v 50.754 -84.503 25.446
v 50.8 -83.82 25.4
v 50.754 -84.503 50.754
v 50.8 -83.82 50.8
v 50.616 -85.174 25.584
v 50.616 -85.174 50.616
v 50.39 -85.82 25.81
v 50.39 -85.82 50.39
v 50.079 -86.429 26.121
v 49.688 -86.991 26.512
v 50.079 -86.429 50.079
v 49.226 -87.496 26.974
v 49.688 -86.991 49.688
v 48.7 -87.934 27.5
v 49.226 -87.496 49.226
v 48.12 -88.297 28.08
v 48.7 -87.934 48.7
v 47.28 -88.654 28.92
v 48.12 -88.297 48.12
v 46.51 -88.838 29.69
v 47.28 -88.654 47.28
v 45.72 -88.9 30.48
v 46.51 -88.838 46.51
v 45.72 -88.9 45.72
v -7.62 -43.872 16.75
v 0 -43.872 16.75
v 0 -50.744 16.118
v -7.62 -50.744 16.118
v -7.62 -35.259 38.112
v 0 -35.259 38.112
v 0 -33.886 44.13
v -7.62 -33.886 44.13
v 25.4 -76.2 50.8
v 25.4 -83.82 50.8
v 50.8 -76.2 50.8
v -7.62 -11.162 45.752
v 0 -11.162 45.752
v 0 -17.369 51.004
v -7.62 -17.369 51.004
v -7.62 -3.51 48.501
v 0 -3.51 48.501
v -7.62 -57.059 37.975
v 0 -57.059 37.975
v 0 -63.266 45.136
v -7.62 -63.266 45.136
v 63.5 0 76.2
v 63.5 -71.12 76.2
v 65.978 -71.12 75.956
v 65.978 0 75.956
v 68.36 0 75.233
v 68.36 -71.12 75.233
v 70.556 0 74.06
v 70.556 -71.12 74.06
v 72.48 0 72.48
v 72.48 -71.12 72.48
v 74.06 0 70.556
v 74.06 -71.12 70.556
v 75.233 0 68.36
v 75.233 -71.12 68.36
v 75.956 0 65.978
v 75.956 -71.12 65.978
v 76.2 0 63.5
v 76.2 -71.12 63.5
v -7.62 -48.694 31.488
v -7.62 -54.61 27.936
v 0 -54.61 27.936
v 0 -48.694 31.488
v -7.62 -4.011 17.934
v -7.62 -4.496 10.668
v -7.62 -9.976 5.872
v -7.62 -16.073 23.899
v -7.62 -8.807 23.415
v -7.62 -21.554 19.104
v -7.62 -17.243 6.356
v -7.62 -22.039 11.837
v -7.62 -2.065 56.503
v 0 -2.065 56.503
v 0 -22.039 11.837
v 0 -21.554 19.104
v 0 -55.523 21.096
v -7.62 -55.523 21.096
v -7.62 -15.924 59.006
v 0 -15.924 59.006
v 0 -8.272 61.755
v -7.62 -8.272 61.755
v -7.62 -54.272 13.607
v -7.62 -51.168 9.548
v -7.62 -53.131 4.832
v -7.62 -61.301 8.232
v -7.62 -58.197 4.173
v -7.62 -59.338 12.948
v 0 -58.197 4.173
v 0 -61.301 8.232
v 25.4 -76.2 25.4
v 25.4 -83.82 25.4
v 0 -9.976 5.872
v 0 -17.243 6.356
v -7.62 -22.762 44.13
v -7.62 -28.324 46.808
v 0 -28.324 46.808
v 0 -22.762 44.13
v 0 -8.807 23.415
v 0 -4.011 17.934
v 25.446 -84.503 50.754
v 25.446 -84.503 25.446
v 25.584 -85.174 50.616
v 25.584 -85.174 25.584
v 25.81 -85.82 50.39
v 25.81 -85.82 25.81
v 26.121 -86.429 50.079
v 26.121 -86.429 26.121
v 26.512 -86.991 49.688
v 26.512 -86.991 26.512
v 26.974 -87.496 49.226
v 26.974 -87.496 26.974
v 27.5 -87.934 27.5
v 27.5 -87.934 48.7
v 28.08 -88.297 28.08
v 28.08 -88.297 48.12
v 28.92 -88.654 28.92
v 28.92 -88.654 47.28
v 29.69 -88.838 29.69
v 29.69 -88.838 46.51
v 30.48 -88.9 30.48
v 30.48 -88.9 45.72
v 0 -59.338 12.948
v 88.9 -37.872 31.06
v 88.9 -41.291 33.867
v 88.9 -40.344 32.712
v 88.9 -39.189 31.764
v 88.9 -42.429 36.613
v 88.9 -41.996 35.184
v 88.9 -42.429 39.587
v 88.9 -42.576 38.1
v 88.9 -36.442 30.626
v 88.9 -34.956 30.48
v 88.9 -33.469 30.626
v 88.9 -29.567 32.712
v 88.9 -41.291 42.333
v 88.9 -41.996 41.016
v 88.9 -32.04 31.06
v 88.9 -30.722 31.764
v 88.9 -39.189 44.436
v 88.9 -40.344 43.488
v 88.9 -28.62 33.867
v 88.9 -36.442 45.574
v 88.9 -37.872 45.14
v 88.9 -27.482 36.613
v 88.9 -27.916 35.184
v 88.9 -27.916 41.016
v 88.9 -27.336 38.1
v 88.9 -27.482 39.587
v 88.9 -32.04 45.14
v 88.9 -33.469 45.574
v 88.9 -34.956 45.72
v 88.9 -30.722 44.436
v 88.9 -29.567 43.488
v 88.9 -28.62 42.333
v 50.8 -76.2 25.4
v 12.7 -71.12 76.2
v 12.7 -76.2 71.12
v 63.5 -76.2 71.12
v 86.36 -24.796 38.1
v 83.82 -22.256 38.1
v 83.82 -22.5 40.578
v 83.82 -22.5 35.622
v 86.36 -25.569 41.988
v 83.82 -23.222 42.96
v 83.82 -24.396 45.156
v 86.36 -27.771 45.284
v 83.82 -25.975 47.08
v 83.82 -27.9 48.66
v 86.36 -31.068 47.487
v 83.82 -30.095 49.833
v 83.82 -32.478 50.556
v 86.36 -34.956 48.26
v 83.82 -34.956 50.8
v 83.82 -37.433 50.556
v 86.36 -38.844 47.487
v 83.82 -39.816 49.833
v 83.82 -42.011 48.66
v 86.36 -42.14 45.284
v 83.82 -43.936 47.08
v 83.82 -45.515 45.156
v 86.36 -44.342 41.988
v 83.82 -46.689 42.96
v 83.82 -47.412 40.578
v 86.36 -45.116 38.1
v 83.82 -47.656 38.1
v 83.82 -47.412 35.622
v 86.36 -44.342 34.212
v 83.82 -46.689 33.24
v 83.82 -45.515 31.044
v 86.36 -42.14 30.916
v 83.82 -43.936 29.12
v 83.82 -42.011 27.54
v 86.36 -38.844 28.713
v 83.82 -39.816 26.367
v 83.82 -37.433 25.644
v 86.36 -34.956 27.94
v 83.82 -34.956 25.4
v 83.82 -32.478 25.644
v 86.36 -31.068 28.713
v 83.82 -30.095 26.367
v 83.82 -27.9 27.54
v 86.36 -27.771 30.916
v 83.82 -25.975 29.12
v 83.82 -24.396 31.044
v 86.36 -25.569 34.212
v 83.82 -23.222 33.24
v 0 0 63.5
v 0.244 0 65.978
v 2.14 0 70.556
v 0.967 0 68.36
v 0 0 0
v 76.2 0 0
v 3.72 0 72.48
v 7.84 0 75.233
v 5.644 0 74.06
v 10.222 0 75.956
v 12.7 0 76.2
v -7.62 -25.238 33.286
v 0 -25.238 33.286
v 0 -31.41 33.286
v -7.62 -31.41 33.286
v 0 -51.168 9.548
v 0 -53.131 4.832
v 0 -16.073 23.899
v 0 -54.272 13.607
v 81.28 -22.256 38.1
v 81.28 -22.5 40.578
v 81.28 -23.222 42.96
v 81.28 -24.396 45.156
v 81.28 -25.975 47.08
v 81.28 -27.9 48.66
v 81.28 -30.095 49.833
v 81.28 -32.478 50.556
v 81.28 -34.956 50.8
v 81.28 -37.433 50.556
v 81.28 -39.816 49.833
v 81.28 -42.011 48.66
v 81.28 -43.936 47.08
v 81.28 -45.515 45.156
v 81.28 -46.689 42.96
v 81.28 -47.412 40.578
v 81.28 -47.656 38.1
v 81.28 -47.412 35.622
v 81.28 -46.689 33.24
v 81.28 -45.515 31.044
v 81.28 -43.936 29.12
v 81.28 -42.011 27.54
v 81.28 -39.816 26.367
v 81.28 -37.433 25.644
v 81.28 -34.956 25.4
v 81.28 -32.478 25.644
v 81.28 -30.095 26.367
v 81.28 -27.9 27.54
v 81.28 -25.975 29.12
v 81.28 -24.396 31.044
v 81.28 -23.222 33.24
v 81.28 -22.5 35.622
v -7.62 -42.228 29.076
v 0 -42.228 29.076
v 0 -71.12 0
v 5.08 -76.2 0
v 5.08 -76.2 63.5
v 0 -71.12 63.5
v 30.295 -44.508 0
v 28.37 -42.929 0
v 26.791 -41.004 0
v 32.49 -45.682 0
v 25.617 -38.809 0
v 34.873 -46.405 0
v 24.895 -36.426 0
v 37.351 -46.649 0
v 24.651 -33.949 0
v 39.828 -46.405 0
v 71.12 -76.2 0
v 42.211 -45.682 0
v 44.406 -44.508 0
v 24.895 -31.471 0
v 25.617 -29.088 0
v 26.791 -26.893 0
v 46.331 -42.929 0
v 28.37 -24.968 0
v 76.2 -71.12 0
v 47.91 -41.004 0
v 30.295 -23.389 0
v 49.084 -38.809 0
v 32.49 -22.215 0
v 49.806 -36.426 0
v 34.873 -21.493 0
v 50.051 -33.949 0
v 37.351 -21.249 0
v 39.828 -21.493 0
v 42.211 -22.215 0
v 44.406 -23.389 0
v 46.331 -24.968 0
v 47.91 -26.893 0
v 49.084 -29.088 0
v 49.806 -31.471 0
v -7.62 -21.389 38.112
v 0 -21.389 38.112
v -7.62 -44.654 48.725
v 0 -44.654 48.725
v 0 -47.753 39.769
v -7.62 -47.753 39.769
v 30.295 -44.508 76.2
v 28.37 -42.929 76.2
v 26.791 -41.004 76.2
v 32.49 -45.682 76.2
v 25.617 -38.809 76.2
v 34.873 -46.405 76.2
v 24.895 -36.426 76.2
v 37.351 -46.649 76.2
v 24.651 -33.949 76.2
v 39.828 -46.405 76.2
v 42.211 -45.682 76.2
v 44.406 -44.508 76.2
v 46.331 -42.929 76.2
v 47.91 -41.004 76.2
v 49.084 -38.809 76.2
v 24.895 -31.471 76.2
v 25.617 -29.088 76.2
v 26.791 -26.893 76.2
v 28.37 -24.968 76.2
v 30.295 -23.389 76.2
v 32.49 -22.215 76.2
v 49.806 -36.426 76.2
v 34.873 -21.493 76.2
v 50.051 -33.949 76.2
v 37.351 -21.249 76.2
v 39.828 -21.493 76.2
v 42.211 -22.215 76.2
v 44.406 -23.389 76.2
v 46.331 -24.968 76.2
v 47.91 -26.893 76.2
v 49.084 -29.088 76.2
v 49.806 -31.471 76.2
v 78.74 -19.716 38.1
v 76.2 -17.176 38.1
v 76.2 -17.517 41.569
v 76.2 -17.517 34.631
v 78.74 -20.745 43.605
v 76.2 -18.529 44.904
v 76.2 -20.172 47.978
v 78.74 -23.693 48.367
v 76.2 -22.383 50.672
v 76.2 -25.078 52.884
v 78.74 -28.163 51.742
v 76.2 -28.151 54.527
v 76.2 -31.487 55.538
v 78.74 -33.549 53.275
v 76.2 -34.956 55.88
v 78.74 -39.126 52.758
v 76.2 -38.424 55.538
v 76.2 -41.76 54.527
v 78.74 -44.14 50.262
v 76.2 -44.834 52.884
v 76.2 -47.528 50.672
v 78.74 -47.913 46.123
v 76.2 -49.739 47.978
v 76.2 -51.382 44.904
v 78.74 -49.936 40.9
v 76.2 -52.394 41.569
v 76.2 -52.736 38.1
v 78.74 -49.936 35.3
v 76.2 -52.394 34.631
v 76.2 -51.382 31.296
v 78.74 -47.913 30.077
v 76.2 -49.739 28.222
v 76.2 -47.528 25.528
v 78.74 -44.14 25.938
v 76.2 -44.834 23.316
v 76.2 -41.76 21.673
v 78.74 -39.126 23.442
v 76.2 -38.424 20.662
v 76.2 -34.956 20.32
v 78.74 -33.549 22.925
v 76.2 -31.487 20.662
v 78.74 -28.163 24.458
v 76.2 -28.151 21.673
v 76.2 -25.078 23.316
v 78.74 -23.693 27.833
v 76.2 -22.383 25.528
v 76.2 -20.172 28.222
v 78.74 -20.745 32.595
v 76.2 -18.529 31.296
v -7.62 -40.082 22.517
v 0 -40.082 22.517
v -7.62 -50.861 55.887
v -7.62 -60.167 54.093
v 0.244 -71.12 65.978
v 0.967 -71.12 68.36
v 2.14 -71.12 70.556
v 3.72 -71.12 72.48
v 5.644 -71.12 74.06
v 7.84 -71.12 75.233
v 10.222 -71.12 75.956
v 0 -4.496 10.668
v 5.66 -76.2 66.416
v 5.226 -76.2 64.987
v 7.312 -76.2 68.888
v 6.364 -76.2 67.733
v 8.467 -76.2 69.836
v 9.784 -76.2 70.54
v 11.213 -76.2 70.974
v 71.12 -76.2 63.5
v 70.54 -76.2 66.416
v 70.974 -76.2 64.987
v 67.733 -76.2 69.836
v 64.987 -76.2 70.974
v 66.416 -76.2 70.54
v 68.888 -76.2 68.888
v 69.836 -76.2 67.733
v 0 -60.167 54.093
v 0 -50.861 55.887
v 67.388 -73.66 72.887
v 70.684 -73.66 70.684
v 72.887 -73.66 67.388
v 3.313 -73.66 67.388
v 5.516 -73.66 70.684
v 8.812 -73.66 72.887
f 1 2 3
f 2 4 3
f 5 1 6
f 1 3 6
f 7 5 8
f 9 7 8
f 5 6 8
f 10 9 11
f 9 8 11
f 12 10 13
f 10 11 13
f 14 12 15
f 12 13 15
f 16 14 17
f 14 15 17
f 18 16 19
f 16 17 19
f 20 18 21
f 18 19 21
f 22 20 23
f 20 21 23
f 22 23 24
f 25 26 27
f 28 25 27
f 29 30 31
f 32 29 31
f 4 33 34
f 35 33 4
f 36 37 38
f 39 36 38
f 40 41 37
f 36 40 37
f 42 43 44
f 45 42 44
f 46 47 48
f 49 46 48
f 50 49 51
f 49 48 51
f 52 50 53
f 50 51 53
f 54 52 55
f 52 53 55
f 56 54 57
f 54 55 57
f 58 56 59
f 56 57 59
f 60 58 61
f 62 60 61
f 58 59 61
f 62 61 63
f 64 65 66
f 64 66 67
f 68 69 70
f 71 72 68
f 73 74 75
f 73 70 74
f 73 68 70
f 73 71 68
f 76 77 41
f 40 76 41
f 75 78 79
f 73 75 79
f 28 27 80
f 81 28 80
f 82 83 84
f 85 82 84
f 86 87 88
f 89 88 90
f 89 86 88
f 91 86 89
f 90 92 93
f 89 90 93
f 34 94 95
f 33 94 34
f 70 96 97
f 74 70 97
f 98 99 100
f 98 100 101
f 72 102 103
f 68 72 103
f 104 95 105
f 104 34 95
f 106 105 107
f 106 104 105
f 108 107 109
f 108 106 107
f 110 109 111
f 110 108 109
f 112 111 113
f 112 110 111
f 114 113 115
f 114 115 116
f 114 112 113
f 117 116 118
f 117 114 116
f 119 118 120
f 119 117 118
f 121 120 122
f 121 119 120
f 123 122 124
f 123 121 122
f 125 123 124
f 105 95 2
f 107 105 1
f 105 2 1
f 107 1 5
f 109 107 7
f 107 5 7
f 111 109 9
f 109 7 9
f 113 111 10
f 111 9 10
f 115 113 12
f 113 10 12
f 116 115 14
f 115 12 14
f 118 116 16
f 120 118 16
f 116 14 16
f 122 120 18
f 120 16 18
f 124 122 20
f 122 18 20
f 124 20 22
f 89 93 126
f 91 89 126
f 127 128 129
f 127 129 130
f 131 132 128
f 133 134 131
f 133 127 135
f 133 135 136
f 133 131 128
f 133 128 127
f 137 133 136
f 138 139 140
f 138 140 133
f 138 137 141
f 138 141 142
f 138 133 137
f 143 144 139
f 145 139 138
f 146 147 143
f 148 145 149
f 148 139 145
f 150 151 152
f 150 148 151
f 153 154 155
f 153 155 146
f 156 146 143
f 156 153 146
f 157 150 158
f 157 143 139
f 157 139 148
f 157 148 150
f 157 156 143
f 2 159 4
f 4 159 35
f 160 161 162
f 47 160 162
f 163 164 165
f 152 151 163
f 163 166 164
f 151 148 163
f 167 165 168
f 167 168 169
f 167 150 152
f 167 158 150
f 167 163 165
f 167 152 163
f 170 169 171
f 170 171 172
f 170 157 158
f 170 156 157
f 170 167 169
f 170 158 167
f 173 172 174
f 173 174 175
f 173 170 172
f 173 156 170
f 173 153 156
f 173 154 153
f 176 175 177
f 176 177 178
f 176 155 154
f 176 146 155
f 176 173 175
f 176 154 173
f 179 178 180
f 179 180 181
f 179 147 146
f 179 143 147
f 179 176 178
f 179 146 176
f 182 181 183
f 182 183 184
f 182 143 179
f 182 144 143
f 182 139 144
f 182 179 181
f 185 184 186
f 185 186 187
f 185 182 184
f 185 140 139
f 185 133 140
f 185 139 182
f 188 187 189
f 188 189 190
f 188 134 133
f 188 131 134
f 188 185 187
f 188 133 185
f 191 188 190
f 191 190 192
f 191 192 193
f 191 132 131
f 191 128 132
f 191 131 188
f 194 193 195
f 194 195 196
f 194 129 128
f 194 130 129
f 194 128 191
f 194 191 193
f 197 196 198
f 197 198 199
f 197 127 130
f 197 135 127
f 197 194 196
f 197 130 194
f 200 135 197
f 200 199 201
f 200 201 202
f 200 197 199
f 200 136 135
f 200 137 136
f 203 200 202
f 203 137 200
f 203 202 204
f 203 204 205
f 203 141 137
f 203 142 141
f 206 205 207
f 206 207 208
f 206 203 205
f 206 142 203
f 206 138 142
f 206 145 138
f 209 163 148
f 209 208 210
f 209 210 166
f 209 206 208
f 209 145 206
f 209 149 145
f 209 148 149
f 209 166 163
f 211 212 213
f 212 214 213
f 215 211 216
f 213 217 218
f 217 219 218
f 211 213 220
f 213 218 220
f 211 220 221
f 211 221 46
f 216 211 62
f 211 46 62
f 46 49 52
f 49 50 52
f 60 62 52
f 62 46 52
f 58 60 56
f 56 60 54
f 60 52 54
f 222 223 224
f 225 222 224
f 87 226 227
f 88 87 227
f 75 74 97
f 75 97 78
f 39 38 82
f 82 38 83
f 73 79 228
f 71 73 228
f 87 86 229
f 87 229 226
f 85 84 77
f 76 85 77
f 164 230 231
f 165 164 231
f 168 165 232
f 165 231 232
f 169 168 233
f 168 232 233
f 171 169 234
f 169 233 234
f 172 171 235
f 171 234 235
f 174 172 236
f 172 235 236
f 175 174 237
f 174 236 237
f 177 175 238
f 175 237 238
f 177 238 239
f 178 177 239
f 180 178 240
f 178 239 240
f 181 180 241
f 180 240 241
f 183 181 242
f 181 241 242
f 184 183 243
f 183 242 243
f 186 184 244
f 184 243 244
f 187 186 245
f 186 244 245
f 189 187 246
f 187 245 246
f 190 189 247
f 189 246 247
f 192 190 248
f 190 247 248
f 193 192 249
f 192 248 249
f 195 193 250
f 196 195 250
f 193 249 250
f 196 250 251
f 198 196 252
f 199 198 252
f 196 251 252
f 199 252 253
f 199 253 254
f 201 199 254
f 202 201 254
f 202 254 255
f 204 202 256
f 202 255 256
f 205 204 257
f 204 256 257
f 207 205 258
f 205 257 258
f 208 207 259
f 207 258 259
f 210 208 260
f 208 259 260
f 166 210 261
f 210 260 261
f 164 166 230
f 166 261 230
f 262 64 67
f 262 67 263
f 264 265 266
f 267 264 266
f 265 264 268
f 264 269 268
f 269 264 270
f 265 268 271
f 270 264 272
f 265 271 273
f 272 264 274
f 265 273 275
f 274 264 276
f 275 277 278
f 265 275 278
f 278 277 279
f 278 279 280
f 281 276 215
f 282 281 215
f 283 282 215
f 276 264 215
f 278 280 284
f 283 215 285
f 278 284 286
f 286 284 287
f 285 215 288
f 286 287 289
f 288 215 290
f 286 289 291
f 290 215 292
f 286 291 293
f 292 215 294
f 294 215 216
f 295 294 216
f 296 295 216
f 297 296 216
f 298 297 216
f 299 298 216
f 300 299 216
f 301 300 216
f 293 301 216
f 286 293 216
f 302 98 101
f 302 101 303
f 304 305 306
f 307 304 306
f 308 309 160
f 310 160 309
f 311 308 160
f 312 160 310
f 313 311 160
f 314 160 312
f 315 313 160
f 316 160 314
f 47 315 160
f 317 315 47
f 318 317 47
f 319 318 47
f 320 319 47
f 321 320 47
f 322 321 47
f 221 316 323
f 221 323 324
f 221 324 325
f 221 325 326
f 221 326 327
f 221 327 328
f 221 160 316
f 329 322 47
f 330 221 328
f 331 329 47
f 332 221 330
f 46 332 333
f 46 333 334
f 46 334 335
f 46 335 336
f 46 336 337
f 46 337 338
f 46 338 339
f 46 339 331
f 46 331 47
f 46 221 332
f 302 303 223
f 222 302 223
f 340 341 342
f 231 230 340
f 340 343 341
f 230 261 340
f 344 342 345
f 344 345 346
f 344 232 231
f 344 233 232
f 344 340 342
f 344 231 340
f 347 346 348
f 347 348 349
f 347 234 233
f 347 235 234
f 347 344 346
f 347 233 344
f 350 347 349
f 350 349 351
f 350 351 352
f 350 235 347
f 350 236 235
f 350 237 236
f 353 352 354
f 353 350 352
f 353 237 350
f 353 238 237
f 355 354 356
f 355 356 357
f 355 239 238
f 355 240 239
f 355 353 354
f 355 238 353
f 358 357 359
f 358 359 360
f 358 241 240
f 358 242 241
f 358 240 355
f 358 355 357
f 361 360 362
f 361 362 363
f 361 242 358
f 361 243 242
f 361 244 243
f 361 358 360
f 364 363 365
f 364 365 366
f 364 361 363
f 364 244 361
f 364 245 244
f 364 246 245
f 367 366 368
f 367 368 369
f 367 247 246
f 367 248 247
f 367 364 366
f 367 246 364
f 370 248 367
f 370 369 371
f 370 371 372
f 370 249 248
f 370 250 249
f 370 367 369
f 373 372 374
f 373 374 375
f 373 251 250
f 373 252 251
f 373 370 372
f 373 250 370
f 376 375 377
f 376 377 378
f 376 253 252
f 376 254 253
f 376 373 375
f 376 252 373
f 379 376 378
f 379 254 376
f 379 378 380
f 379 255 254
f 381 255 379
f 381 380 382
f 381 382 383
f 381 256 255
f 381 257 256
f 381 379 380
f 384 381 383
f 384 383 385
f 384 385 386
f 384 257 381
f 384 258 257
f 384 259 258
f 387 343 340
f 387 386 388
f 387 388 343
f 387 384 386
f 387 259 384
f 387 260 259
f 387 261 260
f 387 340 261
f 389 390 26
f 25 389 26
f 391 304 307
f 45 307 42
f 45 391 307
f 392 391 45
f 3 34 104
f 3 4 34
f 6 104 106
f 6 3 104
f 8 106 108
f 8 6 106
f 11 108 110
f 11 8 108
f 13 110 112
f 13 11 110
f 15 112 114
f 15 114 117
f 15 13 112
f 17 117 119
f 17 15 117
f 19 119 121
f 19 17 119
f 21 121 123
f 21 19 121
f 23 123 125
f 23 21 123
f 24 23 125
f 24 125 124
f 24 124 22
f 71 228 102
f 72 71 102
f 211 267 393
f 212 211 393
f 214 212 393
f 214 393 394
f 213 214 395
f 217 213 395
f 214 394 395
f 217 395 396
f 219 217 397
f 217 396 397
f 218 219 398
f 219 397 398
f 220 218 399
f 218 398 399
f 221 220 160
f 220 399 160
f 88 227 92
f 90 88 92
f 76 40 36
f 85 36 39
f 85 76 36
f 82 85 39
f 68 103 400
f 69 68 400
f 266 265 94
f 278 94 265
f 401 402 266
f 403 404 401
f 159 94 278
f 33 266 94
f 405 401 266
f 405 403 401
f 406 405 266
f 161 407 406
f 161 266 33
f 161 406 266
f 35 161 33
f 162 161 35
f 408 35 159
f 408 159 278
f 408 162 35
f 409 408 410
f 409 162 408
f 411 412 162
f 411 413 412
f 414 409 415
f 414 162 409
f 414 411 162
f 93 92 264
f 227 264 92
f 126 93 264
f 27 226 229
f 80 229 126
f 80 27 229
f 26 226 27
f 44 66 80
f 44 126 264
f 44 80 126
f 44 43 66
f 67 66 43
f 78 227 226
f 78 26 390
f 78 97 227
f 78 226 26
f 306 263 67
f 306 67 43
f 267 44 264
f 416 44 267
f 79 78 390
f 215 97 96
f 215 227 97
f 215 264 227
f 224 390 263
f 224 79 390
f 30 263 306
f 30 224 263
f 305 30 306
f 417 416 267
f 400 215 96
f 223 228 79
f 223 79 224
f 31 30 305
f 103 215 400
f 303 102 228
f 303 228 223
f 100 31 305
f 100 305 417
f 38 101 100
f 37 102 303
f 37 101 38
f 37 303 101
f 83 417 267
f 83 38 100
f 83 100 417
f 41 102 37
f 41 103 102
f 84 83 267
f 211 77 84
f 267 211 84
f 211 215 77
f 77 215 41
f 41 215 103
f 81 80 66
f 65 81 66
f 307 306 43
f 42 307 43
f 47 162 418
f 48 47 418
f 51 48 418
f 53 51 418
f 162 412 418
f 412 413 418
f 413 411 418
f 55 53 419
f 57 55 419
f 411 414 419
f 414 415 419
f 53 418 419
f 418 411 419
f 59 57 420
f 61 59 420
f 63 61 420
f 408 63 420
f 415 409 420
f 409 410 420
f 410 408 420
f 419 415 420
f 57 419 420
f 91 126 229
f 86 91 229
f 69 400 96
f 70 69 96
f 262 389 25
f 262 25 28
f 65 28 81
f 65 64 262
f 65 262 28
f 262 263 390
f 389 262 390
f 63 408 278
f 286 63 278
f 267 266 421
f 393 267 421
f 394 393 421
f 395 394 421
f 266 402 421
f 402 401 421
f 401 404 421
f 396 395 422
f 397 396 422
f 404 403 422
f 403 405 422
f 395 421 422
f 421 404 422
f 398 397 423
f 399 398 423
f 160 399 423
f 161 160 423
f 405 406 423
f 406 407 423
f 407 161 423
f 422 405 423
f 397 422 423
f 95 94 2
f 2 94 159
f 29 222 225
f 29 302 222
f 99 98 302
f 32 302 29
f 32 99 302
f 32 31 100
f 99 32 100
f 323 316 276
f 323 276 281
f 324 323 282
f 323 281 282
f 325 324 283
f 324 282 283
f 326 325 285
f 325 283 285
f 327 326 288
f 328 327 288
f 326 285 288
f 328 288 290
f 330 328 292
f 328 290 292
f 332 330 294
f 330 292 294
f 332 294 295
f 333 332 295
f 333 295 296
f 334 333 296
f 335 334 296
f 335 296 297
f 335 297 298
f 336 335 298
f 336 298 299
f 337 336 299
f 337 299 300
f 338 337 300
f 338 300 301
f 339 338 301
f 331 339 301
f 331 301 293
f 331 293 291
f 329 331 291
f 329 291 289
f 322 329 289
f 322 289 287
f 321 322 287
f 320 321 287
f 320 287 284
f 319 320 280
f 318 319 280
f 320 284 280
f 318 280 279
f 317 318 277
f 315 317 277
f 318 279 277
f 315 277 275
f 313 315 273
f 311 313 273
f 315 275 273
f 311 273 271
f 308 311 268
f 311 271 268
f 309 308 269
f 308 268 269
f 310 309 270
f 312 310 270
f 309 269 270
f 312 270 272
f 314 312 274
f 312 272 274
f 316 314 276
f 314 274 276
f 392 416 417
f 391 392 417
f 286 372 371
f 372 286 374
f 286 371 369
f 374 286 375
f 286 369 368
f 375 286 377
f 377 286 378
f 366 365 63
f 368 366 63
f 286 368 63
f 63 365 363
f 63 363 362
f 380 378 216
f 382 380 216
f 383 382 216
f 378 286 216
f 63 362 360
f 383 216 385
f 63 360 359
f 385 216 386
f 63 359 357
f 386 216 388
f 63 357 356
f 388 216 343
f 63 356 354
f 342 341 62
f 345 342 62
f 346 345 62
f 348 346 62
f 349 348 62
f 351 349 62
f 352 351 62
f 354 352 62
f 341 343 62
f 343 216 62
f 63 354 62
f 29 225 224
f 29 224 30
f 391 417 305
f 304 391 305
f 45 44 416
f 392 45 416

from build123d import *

# Parameters (mm, degrees)
F0_W      = 76.2
F0_H      = 76.2
F1_DEPTH  = 76.2
F3_D      = 25.4
F4_W      = 25.4
F4_H      = 25.4
F5_DEPTH  = 12.7
F6_R      = 12.7
F7_DEPTH  = 12.7
F8_R      = 12.7
F9_R      = 12.7
F10_SIZE  = 5.08
F11_SIZE  = 5.08
F12_R     = 5.08
F14_DEPTH = 7.62
F16_DEPTH = 7.62
F18_DEPTH = 7.62
F20_DEPTH = 7.62
F22_DEPTH = 7.62
F24_DEPTH = 7.62


with BuildPart() as f1:
    # F0 (on Front) → F1 (new body)
    with BuildSketch(Plane.XZ):
        with Locations((38.1, 38.1)):
            Rectangle(F0_W, F0_H)
    extrude(amount=F1_DEPTH)

    # F3 (through all)
    with Locations(Plane.XY.offset(76.2)):
        with Locations((37.350509, -33.948544)):
            Hole(F3_D / 2)

    # F4 (on face) → F5 (join)
    with BuildSketch(Plane.XZ.offset(76.2)):
        with Locations((38.1, 38.1)):
            Rectangle(F4_W, F4_H)
    extrude(amount=F5_DEPTH)

    # F6 (on face) → F7 (join)
    with BuildSketch(Plane.YZ.offset(76.2)):
        with Locations((-34.955569, 38.1)):
            Circle(F6_R)
    extrude(amount=F7_DEPTH)

    # F8
    f8_edges = [f1.edges().sort_by_distance(p)[0] for p in [
        (0, -38.1, 76.2),
    ]]
    fillet(f8_edges, radius=F8_R)

    # F9
    f9_edges = [f1.edges().sort_by_distance(p)[0] for p in [
        (76.2, -38.1, 76.2),
    ]]
    fillet(f9_edges, radius=F9_R)

    # F10
    f10_edges = [f1.edges().sort_by_distance(p)[0] for p in [
        (0, -76.2, 31.75),
    ]]
    chamfer(f10_edges, length=F10_SIZE)

    # F11
    f11_edges = [f1.edges().sort_by_distance(p)[0] for p in [
        (82.55, -22.255569, 38.1),
        (76.2, -47.655569, 38.1),
        (88.9, -47.655569, 38.1),
    ]]
    chamfer(f11_edges, length=F11_SIZE)

    # F12
    f12_edges = [f1.edges().sort_by_distance(p)[0] for p in [
        (38.1, -88.9, 50.8),
        (25.4, -88.9, 38.1),
        (38.1, -88.9, 25.4),
        (50.8, -88.9, 38.1),
    ]]
    fillet(f12_edges, radius=F12_R)

    # F13 (on face) → F14 (join)
    with BuildSketch(Plane(origin=(0, 0, 0), x_dir=(0, -1, 0), z_dir=(-1, 0, 0))):
        Polygon((25.23751, 33.285815), (31.410398, 33.285815), (35.259131, 38.111974), (33.885534, 44.130095), (28.323954, 46.808411), (22.762373, 44.130095), (21.388777, 38.111974), align=None)
    extrude(amount=F14_DEPTH)

    # F15 (on face) → F16 (join)
    with BuildSketch(Plane(origin=(0, 0, 0), x_dir=(0, -1, 0), z_dir=(-1, 0, 0))):
        Polygon((50.743747, 16.11791), (55.522759, 21.096045), (54.610361, 27.936243), (48.693608, 31.487695), (42.227936, 29.076085), (40.082127, 22.517406), (43.87202, 16.750475), align=None)
    extrude(amount=F16_DEPTH)

    # F17 (on face) → F18 (join)
    with BuildSketch(Plane(origin=(0, 0, 0), x_dir=(0, -1, 0), z_dir=(-1, 0, 0))):
        Polygon((57.059099, 37.974671), (63.266012, 45.136495), (60.167147, 54.092752), (50.861369, 55.887184), (44.654456, 48.72536), (47.753321, 39.769104), align=None)
    extrude(amount=F18_DEPTH)

    # F19 (on face) → F20 (join)
    with BuildSketch(Plane(origin=(0, 0, 0), x_dir=(0, -1, 0), z_dir=(-1, 0, 0))):
        Polygon((17.242883, 6.356385), (22.038512, 11.837104), (21.55408, 19.10358), (16.07336, 23.89921), (8.806884, 23.414778), (4.011255, 17.934058), (4.495687, 10.667582), (9.976407, 5.871953), align=None)
    extrude(amount=F20_DEPTH)

    # F21 (on face) → F22 (join)
    with BuildSketch(Plane(origin=(0, 0, 0), x_dir=(0, -1, 0), z_dir=(-1, 0, 0))):
        Polygon((11.161887, 45.752136), (17.368809, 51.004144), (15.923897, 59.0055), (8.272064, 61.754847), (2.065142, 56.502839), (3.510054, 48.501483), align=None)
    extrude(amount=F22_DEPTH)

    # F23 (on face) → F24 (join)
    with BuildSketch(Plane(origin=(0, 0, 0), x_dir=(0, -1, 0), z_dir=(-1, 0, 0))):
        Polygon((58.197337, 4.173143), (61.300796, 8.231508), (59.337879, 12.948366), (54.271501, 13.606857), (51.168042, 9.548492), (53.13096, 4.831635), align=None)
    extrude(amount=F24_DEPTH)


solid = f1.part
